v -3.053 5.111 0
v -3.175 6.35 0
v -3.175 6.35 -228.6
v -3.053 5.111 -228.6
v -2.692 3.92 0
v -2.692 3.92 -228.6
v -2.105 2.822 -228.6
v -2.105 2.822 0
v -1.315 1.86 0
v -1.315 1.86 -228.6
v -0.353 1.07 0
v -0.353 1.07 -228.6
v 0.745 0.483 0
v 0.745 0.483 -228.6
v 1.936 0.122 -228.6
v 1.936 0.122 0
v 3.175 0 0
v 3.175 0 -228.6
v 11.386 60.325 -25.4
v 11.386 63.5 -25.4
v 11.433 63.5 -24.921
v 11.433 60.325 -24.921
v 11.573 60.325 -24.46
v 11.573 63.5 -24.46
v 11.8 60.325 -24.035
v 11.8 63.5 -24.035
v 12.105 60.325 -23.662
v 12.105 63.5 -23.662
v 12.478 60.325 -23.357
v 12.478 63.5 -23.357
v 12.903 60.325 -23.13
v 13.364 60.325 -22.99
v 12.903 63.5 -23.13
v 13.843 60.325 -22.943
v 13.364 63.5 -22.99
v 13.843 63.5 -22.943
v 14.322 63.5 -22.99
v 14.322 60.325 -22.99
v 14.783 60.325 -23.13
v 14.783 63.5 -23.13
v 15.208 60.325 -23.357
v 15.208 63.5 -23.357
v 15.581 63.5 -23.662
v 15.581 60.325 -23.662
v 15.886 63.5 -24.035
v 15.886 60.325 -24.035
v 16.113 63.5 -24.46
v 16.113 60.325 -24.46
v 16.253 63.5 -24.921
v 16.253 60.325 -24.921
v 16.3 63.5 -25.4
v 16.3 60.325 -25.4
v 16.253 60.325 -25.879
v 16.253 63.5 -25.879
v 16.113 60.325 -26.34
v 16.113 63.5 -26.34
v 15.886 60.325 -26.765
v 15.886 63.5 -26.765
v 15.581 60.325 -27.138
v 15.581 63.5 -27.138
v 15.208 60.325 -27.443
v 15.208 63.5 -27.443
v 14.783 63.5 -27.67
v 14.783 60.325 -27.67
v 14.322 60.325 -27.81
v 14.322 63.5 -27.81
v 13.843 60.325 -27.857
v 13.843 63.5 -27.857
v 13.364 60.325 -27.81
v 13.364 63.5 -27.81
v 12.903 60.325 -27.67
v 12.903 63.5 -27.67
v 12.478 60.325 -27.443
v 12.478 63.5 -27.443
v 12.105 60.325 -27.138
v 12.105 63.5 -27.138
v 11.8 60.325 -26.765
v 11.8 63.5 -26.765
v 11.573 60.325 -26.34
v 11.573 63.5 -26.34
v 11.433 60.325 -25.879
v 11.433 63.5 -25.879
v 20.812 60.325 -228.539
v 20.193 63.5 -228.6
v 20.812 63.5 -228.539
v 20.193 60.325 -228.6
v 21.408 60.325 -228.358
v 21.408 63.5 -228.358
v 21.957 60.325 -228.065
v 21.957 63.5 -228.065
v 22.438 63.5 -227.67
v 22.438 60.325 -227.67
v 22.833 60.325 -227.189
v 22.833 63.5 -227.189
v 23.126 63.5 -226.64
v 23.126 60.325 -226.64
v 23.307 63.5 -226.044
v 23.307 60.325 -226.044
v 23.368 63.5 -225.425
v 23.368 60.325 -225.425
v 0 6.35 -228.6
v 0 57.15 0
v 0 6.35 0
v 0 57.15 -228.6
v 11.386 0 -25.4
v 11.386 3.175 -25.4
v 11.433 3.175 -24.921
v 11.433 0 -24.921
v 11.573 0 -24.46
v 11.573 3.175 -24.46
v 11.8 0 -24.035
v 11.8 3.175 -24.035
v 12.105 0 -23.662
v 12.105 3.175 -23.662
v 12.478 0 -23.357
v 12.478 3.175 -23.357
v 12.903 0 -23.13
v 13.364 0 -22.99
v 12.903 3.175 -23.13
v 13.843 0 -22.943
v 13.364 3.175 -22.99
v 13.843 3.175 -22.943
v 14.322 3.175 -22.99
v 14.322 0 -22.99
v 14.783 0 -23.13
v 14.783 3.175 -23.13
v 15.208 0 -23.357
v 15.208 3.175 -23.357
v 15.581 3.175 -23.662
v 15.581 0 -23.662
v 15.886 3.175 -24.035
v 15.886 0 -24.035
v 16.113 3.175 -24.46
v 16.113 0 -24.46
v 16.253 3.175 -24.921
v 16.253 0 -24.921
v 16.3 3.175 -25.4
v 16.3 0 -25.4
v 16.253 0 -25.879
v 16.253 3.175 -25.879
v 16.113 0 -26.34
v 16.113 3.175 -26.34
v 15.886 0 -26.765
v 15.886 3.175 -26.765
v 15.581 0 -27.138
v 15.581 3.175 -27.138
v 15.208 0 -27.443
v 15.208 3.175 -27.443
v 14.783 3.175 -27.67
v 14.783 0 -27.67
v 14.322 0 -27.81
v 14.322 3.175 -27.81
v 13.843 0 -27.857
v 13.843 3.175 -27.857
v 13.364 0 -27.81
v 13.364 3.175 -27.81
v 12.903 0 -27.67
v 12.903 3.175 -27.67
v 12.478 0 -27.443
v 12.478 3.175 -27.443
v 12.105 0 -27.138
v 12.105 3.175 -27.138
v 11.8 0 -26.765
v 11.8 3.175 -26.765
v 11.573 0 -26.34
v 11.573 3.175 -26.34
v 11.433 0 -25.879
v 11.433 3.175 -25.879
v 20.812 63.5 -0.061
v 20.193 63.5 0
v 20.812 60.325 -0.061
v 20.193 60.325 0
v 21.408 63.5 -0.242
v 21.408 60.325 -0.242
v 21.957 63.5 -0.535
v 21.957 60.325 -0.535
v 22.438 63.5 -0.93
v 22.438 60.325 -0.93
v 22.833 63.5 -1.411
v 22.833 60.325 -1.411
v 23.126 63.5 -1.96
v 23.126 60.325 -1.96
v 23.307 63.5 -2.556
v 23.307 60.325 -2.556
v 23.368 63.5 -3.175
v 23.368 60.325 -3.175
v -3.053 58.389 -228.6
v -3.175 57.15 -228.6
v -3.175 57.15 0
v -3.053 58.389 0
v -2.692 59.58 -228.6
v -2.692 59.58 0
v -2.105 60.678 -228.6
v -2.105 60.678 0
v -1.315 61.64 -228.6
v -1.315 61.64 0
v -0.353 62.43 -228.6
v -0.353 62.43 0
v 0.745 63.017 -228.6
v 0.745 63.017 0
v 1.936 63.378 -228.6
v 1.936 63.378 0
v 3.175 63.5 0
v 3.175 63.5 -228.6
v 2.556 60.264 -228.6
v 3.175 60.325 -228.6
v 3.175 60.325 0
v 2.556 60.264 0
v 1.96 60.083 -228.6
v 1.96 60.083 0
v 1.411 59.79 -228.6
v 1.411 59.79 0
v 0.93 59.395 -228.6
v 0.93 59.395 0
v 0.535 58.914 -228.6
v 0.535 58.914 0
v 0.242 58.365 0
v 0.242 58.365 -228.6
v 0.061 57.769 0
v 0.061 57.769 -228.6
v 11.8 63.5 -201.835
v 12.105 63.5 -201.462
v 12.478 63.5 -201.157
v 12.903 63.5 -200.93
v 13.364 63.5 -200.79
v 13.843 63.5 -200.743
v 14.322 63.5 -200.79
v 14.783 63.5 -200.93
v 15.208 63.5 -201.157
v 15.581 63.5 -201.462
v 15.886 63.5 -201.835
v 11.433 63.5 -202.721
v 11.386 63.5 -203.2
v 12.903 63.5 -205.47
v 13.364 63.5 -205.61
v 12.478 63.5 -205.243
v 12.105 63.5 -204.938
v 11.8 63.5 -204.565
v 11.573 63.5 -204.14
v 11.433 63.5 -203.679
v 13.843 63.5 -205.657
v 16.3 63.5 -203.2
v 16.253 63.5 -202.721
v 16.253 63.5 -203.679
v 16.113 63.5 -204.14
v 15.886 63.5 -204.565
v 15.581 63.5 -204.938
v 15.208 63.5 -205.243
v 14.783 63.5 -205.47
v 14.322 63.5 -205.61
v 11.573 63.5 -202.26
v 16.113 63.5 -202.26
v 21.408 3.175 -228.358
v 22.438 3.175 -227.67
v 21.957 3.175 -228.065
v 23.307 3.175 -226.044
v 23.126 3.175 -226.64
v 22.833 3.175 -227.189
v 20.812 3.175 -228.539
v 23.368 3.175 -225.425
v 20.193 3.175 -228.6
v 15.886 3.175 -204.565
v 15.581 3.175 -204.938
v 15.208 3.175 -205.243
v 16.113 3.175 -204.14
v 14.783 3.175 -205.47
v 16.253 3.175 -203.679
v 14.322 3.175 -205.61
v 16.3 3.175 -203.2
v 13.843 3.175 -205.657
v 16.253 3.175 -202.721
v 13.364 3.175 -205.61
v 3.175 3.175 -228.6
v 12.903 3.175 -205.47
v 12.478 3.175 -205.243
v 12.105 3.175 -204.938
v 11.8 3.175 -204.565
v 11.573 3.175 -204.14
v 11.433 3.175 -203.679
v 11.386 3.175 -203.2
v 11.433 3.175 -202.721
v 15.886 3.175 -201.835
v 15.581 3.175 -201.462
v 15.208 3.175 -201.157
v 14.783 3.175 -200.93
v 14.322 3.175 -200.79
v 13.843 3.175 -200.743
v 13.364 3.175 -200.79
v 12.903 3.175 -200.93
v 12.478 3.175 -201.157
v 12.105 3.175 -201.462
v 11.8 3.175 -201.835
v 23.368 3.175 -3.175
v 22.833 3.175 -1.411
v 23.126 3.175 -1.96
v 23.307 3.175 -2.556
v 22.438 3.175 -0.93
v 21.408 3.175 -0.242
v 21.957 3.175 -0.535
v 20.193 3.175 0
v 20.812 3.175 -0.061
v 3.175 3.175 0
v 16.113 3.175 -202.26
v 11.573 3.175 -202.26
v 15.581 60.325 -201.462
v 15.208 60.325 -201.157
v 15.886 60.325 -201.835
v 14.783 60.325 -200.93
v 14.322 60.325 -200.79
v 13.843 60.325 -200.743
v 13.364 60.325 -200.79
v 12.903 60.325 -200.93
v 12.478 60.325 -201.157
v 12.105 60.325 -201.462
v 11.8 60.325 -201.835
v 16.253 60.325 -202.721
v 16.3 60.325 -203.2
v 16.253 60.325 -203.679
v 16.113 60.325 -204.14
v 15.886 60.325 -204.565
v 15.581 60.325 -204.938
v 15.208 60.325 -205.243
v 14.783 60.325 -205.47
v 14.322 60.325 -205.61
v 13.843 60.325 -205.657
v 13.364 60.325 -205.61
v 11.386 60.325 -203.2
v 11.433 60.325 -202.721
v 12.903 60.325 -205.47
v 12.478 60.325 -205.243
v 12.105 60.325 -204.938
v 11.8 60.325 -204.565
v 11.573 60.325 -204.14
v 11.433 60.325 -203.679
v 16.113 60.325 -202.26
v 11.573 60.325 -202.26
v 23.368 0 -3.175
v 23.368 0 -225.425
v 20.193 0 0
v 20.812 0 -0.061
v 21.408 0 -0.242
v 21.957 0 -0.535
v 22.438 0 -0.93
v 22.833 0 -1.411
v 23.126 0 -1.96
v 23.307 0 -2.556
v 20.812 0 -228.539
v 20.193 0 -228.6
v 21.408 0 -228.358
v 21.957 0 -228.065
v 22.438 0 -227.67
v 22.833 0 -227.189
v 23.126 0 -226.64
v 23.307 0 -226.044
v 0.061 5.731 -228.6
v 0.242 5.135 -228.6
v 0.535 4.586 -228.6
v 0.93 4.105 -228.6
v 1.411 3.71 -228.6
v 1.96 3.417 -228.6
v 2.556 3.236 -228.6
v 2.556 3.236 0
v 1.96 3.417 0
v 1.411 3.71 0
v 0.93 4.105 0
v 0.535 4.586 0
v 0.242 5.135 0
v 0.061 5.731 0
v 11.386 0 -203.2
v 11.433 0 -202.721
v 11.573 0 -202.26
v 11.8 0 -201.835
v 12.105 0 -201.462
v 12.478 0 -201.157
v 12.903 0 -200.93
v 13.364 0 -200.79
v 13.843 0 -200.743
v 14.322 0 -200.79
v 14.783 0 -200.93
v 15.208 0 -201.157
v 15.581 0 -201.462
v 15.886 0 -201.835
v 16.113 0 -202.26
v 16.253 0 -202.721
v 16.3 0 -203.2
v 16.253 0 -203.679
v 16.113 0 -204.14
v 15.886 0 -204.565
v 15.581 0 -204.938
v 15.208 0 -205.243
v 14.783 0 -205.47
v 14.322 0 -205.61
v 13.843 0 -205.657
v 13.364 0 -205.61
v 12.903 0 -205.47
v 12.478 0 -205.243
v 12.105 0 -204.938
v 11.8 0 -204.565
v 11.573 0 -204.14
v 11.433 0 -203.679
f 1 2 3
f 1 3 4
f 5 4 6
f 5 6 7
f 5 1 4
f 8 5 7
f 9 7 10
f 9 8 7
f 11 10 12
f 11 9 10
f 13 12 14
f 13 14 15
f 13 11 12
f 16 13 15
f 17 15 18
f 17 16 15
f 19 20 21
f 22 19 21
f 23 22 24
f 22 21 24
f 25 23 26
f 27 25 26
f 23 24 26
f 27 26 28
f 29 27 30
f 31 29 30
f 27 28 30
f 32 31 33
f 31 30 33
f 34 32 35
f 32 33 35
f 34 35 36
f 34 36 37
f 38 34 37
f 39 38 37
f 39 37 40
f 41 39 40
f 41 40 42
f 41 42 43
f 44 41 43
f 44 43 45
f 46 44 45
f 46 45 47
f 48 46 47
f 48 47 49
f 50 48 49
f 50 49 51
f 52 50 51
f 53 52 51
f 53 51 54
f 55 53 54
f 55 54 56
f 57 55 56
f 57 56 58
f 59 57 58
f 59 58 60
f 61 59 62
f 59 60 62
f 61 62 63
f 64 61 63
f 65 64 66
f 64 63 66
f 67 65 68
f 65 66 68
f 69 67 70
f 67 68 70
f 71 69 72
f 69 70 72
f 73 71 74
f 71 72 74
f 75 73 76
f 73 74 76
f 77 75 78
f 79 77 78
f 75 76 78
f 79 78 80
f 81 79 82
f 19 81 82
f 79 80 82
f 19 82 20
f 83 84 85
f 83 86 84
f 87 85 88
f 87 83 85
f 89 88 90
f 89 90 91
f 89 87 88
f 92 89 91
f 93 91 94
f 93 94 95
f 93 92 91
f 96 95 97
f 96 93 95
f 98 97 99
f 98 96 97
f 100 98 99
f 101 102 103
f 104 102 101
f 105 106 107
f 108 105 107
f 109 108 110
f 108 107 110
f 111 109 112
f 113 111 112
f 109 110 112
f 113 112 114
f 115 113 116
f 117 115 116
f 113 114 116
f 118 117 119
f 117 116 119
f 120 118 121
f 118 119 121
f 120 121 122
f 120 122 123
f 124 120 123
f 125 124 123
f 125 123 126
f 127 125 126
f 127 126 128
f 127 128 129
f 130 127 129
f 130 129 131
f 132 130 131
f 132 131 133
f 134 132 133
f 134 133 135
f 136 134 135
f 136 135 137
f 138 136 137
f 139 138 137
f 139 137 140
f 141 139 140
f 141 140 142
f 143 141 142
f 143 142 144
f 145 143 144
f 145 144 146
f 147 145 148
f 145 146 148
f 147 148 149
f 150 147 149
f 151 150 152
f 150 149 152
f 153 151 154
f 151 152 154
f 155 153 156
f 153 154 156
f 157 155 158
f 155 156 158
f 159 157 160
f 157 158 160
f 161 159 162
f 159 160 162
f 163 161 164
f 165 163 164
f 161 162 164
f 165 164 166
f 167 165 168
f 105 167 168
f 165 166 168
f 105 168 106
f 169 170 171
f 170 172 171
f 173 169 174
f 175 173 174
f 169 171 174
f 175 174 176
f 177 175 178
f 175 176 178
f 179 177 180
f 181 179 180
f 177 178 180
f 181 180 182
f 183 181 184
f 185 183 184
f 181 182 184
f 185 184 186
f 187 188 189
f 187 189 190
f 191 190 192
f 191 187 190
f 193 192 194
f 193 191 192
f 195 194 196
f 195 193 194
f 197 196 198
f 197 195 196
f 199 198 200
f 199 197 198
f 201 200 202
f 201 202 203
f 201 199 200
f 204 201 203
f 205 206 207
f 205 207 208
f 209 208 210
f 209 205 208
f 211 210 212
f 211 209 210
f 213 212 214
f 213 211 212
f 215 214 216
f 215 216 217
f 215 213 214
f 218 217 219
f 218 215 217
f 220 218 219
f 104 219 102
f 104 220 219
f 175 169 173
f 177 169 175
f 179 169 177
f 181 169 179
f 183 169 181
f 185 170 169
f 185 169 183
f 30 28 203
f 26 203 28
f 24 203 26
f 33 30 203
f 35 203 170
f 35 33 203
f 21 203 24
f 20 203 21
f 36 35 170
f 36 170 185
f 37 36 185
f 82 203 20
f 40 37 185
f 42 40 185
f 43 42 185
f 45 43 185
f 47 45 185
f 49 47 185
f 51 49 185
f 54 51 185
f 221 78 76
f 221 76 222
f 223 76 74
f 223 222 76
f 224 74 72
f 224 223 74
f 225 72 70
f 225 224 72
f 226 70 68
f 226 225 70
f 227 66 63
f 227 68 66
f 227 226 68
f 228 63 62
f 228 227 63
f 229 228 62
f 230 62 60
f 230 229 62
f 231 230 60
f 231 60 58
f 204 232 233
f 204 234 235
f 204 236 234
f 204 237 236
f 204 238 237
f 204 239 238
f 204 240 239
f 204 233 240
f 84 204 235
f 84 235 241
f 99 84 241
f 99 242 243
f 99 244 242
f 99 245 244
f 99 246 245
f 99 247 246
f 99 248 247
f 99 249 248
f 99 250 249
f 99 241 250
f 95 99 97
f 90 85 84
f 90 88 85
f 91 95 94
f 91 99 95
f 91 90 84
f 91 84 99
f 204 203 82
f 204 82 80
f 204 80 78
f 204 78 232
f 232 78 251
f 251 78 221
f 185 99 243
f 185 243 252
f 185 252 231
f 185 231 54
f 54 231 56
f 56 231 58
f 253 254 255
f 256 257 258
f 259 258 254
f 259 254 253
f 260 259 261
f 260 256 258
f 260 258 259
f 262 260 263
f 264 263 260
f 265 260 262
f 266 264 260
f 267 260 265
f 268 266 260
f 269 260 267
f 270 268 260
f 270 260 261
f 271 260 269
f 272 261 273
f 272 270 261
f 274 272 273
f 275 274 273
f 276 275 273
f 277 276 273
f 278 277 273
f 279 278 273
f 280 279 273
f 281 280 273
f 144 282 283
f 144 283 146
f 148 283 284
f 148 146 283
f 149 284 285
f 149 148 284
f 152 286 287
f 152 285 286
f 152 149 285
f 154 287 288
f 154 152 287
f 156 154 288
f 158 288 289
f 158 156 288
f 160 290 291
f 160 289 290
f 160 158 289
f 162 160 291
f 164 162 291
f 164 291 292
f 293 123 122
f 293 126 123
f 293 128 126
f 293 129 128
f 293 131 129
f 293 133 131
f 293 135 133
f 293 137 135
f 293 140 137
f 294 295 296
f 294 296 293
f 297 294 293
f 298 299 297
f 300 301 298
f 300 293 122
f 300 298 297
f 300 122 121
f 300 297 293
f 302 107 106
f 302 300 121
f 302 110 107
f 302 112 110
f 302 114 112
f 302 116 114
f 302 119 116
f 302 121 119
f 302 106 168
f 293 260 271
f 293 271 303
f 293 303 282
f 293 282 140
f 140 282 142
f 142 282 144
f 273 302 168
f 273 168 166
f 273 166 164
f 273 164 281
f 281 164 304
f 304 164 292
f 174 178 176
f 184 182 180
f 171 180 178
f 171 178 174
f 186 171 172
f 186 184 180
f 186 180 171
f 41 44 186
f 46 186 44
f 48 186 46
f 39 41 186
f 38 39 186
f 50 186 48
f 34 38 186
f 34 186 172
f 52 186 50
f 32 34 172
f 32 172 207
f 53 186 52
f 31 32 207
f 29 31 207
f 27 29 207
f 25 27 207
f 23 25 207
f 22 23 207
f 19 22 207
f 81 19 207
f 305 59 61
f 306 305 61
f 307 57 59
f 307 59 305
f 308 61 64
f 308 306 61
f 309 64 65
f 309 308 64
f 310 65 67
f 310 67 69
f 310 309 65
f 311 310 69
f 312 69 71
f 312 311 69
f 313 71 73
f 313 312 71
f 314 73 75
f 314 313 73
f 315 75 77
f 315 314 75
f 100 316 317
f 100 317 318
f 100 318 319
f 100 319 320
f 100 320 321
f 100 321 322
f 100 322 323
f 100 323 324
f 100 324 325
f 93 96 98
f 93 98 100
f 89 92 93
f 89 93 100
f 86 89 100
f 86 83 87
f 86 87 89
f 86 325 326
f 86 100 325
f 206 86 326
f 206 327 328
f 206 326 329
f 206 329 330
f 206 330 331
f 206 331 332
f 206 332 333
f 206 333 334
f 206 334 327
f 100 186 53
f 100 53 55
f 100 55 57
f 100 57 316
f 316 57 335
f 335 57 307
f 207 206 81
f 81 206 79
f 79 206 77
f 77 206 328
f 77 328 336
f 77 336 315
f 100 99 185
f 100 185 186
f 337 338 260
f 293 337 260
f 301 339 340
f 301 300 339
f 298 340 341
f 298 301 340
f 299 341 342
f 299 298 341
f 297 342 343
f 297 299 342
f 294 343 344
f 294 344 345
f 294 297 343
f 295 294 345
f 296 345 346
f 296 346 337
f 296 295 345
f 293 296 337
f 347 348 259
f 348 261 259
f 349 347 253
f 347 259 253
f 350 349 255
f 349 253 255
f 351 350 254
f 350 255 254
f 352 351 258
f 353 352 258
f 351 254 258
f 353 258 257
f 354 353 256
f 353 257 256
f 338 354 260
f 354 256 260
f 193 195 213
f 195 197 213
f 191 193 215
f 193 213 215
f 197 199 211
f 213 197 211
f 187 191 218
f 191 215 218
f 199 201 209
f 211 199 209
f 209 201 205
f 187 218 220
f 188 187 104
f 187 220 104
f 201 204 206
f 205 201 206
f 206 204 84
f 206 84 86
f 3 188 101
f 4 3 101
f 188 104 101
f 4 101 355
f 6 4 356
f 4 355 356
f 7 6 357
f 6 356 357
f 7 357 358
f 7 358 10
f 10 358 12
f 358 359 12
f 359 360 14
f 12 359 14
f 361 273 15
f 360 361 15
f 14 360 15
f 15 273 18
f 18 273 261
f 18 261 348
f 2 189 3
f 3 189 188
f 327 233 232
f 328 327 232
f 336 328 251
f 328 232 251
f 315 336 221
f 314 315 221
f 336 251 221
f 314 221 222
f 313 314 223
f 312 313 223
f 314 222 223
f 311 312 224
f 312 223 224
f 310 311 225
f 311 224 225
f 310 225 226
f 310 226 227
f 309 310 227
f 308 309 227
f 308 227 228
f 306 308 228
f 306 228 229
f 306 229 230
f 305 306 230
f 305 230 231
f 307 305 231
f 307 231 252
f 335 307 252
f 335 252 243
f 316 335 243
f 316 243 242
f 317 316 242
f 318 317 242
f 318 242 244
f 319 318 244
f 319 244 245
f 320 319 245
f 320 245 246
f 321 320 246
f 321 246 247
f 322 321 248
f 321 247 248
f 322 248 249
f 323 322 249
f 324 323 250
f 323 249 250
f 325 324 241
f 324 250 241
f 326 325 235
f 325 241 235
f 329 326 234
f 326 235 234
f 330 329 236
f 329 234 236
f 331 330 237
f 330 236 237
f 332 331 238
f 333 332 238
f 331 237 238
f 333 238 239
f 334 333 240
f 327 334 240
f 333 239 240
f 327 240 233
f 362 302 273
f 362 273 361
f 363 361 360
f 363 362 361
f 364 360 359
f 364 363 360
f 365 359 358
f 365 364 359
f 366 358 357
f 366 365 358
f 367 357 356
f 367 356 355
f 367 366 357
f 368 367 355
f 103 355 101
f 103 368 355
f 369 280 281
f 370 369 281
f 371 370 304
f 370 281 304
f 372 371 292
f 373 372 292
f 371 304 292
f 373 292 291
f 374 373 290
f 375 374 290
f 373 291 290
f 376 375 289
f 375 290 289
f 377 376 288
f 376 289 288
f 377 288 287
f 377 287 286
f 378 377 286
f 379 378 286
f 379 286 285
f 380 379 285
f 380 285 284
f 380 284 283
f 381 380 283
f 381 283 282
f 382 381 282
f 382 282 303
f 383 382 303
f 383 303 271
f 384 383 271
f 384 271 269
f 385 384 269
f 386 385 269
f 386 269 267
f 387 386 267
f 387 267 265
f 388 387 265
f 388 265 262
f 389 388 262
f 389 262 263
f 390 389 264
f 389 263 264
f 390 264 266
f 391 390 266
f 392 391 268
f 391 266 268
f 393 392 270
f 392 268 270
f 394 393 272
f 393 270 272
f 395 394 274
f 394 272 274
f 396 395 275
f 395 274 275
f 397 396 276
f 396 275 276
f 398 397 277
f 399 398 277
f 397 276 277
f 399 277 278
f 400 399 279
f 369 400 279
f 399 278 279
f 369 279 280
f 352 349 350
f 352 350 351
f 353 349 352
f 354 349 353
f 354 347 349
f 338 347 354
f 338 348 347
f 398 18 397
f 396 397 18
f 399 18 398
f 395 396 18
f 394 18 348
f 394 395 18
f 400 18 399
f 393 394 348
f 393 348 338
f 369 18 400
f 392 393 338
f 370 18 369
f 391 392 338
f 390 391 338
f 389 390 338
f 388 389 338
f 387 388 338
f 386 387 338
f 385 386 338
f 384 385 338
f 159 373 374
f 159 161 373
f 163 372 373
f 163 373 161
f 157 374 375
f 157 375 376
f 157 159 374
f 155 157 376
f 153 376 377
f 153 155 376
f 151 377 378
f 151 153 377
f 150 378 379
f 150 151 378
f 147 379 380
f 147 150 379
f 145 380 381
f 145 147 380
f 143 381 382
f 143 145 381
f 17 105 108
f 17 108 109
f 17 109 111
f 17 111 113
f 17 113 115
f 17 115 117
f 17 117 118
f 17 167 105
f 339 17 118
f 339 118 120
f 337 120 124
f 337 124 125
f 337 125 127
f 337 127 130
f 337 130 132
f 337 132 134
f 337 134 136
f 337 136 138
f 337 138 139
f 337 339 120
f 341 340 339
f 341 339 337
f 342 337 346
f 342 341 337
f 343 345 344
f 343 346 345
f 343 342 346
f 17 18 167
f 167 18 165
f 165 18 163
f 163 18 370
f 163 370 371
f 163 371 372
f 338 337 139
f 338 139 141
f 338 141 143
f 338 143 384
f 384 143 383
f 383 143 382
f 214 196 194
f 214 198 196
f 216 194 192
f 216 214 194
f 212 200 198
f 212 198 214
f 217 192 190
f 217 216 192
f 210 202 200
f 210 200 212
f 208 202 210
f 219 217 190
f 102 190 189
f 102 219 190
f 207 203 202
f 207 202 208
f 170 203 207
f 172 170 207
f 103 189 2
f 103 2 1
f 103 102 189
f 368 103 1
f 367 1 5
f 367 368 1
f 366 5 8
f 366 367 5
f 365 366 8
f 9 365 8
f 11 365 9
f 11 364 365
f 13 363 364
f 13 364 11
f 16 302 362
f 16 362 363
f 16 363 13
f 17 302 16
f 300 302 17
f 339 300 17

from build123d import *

# Parameters (mm, degrees)
SKETCH1_W                      = 228.6
SKETCH1_H                      = 63.5
BASE_FLANGE1_DEPTH             = 3.175
EDGE_FLANGE1_STRIP_W           = 19.05
EDGE_FLANGE1_STRIP_H           = 3.175
EDGE_FLANGE1_STRIP_CUT_DEPTH   = 228.6
EDGE_FLANGE1_STRIP_2_W         = 19.05
EDGE_FLANGE1_STRIP_2_H         = 3.175
EDGE_FLANGE1_STRIP_CUT_2_DEPTH = 228.6
EDGE_FLANGE1_DEPTH             = 228.6
EDGE_FLANGE1_BEND_DEPTH        = 228.6
SKETCH12_R                     = 2.45745
CUT_EXTRUDE1_DEPTH             = 239.403593564
FILLET1_R                      = 3.175


# Sheet-metal steps are written as plain solids
with BuildPart() as part:
    # Sketch1 → Base-Flange1 (new body)
    with BuildSketch(Plane(origin=(0, 0, 0), x_dir=(0, 0, -1), z_dir=(1, 0, 0))):
        with Locations((114.3, 31.75)):
            Rectangle(SKETCH1_W, SKETCH1_H)
    extrude(amount=-BASE_FLANGE1_DEPTH)

    # Edge-Flange1 strip (across the edge) → Edge-Flange1 strip cut (cut)
    with BuildSketch(Plane(origin=(0, 63.5, -228.6), x_dir=(0, -1, 0), z_dir=(0, 0, 1))):
        with Locations((-3.175, -1.5875)):
            Rectangle(EDGE_FLANGE1_STRIP_W, EDGE_FLANGE1_STRIP_H)
    extrude(amount=EDGE_FLANGE1_STRIP_CUT_DEPTH, mode=Mode.SUBTRACT)

    # Edge-Flange1 strip 2 (across the edge) → Edge-Flange1 strip cut 2 (cut)
    with BuildSketch(Plane.YX):
        with Locations((-3.175, -1.5875)):
            Rectangle(EDGE_FLANGE1_STRIP_2_W, EDGE_FLANGE1_STRIP_2_H)
    extrude(amount=EDGE_FLANGE1_STRIP_CUT_2_DEPTH, mode=Mode.SUBTRACT)

    # Edge-Flange1 section (across the edge) → Edge-Flange1 (add)
    with BuildSketch(Plane(origin=(0, 63.5, -228.6), x_dir=(0, -1, 0), z_dir=(0, 0, 1))):
        with BuildLine():
            Line((0, 3.175), (0, 23.368))
            Line((0, 23.368), (3.175, 23.368))
            Line((3.175, 23.368), (3.175, 3.175))
            ThreePointArc((3.175, 3.175), (4.10493597, 0.92993597), (6.35, 0))
            Line((6.35, 0), (6.35, -3.175))
            ThreePointArc((6.35, -3.175), (1.859871939, -1.315128061), (0, 3.175))
        make_face()
    extrude(amount=EDGE_FLANGE1_DEPTH)

    # Edge-Flange1 section 2 (across the edge) → Edge-Flange1 bend (add)
    with BuildSketch(Plane.YX):
        with BuildLine():
            Line((0, 3.175), (0, 23.368))
            Line((0, 23.368), (3.175, 23.368))
            Line((3.175, 23.368), (3.175, 3.175))
            ThreePointArc((3.175, 3.175), (4.10493597, 0.92993597), (6.35, 0))
            Line((6.35, 0), (6.35, -3.175))
            ThreePointArc((6.35, -3.175), (1.859871939, -1.315128061), (0, 3.175))
        make_face()
    extrude(amount=EDGE_FLANGE1_BEND_DEPTH)

    # Sketch12 → Cut-Extrude1 (cut, through all)
    with BuildSketch(Plane(origin=(0, 63.5, 0), x_dir=(1, 0, 0), z_dir=(0, 1, 0))):
        with Locations(Location((13.843, 203.2, 0), (0, 0, 180))):
            Circle(SKETCH12_R)
        with Locations(Location((13.843, 25.4, 0), (0, 0, 180))):
            Circle(SKETCH12_R)
    extrude(amount=-CUT_EXTRUDE1_DEPTH, mode=Mode.SUBTRACT)

    # Fillet1
    fillet1_edges = [part.edges().sort_by_distance(p)[0] for p in [
        (23.368, 61.9125, -228.6),
        (23.368, 61.9125, 0),
        (23.368, 1.5875, 0),
        (23.368, 1.5875, -228.6),
    ]]
    fillet(fillet1_edges, radius=FILLET1_R)


solid = part.part
